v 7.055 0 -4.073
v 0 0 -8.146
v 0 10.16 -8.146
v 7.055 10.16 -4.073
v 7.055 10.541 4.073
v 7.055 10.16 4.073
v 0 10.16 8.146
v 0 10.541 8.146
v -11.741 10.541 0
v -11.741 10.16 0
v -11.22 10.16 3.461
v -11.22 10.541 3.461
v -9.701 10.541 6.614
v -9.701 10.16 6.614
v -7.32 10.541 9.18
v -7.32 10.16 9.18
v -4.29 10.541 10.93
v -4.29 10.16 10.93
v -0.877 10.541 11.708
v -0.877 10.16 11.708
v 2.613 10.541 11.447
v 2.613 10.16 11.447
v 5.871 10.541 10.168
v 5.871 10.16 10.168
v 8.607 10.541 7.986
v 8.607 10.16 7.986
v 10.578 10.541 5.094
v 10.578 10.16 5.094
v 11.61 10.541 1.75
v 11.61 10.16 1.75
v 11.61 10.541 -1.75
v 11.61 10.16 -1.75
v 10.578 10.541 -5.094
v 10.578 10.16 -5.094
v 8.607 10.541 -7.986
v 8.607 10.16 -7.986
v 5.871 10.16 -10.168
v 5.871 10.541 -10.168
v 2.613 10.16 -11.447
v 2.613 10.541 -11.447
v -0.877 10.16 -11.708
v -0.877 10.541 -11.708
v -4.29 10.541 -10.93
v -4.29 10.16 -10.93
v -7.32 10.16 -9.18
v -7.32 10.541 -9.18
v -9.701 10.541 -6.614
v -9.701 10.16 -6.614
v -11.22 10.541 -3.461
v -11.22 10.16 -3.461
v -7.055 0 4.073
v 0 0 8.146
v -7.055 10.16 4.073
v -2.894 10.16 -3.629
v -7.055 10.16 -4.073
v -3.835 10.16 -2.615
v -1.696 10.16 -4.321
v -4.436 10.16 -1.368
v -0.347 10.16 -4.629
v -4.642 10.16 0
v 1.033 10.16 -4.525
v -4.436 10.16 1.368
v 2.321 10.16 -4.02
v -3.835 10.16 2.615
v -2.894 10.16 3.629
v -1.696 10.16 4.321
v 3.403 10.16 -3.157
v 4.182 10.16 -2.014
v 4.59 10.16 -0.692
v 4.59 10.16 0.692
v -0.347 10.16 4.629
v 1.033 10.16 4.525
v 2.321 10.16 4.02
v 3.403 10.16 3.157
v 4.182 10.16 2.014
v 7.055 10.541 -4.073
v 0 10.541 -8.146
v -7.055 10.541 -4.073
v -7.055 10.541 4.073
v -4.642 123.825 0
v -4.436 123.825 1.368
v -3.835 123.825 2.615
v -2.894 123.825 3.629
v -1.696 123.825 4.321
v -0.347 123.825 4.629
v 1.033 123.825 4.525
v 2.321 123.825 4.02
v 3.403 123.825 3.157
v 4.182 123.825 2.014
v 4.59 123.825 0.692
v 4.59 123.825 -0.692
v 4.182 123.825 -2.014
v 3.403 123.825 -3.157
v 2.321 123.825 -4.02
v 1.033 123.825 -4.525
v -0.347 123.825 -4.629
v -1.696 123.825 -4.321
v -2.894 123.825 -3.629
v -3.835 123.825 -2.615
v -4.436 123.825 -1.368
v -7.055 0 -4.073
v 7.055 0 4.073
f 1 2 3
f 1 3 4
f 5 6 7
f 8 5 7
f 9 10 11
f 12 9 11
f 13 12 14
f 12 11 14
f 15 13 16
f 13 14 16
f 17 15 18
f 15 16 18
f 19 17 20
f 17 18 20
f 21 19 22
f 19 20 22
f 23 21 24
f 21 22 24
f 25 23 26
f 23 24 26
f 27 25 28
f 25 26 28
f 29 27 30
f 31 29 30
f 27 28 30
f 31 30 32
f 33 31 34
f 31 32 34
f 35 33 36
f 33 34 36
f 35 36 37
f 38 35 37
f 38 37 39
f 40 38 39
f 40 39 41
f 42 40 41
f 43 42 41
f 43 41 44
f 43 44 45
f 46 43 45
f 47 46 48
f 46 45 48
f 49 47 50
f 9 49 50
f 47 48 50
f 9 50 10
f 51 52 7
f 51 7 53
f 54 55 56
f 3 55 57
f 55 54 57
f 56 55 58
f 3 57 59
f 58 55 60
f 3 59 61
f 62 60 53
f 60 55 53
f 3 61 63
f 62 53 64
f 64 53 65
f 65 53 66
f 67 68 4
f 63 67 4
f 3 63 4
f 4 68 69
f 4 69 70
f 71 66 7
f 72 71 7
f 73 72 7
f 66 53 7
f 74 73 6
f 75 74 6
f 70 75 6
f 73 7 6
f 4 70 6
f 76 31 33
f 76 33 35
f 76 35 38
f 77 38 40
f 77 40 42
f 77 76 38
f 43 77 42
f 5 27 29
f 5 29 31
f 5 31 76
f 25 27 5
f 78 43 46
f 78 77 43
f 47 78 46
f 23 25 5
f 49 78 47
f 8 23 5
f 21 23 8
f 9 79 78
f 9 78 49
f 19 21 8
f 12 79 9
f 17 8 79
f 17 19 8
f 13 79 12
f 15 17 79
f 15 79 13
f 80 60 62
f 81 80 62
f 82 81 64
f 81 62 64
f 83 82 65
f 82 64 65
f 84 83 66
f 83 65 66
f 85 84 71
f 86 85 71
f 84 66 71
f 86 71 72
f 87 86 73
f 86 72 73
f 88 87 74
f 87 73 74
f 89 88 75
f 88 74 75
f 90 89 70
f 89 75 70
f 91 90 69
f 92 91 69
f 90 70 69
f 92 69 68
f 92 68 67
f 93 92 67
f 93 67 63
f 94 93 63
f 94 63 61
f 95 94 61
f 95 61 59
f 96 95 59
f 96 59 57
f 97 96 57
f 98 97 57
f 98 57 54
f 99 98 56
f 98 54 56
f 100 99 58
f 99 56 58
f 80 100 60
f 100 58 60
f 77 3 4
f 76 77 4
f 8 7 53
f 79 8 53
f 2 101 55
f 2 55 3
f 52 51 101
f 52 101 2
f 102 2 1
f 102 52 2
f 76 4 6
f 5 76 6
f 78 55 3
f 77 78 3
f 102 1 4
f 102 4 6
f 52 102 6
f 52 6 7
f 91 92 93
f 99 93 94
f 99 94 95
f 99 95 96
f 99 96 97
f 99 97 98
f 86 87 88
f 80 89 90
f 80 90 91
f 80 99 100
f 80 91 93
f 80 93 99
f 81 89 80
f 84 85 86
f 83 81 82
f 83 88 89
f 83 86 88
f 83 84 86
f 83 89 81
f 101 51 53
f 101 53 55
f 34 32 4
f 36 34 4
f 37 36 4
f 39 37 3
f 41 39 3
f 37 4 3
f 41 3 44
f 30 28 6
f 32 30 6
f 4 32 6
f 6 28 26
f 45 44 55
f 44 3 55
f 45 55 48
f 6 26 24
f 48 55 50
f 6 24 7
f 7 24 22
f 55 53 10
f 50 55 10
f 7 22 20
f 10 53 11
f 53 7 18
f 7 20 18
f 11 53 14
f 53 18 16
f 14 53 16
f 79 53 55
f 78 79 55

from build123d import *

# Parameters (mm, degrees)
F1_DEPTH = 10.16
F3_R     = 11.74115
F4_DEPTH = 0.381
F2_R     = 4.64185
F5_DEPTH = 113.665


with BuildPart() as f1:
    # F0 (on Front) → F1 (new body)
    with BuildSketch(Plane.XZ):
        Polygon((7.05485, -4.07312), (7.05485, 4.07312), (0, 8.146239), (-7.05485, 4.07312), (-7.05485, -4.07312), (0, -8.146239), align=None)
    extrude(amount=-F1_DEPTH)

    # F2 (on face) → F5 (join)
    with BuildSketch(Plane(origin=(0, 10.16, 0), x_dir=(-1, 0, 0), z_dir=(0, 1, 0))):
        Circle(F2_R)
    extrude(amount=F5_DEPTH)


with BuildPart() as f4:
    # F3 (on face) → F4 (new body)
    with BuildSketch(Plane(origin=(0, 10.16, 0), x_dir=(-1, 0, 0), z_dir=(0, 1, 0))):
        Circle(F3_R)
        Polygon((-7.05485, -4.07312), (-7.05485, 4.07312), (0, 8.146239), (7.05485, 4.07312), (7.05485, -4.07312), (0, -8.146239), align=None, mode=Mode.SUBTRACT)
    extrude(amount=F4_DEPTH)


solid = Compound([f1.part, f4.part])
